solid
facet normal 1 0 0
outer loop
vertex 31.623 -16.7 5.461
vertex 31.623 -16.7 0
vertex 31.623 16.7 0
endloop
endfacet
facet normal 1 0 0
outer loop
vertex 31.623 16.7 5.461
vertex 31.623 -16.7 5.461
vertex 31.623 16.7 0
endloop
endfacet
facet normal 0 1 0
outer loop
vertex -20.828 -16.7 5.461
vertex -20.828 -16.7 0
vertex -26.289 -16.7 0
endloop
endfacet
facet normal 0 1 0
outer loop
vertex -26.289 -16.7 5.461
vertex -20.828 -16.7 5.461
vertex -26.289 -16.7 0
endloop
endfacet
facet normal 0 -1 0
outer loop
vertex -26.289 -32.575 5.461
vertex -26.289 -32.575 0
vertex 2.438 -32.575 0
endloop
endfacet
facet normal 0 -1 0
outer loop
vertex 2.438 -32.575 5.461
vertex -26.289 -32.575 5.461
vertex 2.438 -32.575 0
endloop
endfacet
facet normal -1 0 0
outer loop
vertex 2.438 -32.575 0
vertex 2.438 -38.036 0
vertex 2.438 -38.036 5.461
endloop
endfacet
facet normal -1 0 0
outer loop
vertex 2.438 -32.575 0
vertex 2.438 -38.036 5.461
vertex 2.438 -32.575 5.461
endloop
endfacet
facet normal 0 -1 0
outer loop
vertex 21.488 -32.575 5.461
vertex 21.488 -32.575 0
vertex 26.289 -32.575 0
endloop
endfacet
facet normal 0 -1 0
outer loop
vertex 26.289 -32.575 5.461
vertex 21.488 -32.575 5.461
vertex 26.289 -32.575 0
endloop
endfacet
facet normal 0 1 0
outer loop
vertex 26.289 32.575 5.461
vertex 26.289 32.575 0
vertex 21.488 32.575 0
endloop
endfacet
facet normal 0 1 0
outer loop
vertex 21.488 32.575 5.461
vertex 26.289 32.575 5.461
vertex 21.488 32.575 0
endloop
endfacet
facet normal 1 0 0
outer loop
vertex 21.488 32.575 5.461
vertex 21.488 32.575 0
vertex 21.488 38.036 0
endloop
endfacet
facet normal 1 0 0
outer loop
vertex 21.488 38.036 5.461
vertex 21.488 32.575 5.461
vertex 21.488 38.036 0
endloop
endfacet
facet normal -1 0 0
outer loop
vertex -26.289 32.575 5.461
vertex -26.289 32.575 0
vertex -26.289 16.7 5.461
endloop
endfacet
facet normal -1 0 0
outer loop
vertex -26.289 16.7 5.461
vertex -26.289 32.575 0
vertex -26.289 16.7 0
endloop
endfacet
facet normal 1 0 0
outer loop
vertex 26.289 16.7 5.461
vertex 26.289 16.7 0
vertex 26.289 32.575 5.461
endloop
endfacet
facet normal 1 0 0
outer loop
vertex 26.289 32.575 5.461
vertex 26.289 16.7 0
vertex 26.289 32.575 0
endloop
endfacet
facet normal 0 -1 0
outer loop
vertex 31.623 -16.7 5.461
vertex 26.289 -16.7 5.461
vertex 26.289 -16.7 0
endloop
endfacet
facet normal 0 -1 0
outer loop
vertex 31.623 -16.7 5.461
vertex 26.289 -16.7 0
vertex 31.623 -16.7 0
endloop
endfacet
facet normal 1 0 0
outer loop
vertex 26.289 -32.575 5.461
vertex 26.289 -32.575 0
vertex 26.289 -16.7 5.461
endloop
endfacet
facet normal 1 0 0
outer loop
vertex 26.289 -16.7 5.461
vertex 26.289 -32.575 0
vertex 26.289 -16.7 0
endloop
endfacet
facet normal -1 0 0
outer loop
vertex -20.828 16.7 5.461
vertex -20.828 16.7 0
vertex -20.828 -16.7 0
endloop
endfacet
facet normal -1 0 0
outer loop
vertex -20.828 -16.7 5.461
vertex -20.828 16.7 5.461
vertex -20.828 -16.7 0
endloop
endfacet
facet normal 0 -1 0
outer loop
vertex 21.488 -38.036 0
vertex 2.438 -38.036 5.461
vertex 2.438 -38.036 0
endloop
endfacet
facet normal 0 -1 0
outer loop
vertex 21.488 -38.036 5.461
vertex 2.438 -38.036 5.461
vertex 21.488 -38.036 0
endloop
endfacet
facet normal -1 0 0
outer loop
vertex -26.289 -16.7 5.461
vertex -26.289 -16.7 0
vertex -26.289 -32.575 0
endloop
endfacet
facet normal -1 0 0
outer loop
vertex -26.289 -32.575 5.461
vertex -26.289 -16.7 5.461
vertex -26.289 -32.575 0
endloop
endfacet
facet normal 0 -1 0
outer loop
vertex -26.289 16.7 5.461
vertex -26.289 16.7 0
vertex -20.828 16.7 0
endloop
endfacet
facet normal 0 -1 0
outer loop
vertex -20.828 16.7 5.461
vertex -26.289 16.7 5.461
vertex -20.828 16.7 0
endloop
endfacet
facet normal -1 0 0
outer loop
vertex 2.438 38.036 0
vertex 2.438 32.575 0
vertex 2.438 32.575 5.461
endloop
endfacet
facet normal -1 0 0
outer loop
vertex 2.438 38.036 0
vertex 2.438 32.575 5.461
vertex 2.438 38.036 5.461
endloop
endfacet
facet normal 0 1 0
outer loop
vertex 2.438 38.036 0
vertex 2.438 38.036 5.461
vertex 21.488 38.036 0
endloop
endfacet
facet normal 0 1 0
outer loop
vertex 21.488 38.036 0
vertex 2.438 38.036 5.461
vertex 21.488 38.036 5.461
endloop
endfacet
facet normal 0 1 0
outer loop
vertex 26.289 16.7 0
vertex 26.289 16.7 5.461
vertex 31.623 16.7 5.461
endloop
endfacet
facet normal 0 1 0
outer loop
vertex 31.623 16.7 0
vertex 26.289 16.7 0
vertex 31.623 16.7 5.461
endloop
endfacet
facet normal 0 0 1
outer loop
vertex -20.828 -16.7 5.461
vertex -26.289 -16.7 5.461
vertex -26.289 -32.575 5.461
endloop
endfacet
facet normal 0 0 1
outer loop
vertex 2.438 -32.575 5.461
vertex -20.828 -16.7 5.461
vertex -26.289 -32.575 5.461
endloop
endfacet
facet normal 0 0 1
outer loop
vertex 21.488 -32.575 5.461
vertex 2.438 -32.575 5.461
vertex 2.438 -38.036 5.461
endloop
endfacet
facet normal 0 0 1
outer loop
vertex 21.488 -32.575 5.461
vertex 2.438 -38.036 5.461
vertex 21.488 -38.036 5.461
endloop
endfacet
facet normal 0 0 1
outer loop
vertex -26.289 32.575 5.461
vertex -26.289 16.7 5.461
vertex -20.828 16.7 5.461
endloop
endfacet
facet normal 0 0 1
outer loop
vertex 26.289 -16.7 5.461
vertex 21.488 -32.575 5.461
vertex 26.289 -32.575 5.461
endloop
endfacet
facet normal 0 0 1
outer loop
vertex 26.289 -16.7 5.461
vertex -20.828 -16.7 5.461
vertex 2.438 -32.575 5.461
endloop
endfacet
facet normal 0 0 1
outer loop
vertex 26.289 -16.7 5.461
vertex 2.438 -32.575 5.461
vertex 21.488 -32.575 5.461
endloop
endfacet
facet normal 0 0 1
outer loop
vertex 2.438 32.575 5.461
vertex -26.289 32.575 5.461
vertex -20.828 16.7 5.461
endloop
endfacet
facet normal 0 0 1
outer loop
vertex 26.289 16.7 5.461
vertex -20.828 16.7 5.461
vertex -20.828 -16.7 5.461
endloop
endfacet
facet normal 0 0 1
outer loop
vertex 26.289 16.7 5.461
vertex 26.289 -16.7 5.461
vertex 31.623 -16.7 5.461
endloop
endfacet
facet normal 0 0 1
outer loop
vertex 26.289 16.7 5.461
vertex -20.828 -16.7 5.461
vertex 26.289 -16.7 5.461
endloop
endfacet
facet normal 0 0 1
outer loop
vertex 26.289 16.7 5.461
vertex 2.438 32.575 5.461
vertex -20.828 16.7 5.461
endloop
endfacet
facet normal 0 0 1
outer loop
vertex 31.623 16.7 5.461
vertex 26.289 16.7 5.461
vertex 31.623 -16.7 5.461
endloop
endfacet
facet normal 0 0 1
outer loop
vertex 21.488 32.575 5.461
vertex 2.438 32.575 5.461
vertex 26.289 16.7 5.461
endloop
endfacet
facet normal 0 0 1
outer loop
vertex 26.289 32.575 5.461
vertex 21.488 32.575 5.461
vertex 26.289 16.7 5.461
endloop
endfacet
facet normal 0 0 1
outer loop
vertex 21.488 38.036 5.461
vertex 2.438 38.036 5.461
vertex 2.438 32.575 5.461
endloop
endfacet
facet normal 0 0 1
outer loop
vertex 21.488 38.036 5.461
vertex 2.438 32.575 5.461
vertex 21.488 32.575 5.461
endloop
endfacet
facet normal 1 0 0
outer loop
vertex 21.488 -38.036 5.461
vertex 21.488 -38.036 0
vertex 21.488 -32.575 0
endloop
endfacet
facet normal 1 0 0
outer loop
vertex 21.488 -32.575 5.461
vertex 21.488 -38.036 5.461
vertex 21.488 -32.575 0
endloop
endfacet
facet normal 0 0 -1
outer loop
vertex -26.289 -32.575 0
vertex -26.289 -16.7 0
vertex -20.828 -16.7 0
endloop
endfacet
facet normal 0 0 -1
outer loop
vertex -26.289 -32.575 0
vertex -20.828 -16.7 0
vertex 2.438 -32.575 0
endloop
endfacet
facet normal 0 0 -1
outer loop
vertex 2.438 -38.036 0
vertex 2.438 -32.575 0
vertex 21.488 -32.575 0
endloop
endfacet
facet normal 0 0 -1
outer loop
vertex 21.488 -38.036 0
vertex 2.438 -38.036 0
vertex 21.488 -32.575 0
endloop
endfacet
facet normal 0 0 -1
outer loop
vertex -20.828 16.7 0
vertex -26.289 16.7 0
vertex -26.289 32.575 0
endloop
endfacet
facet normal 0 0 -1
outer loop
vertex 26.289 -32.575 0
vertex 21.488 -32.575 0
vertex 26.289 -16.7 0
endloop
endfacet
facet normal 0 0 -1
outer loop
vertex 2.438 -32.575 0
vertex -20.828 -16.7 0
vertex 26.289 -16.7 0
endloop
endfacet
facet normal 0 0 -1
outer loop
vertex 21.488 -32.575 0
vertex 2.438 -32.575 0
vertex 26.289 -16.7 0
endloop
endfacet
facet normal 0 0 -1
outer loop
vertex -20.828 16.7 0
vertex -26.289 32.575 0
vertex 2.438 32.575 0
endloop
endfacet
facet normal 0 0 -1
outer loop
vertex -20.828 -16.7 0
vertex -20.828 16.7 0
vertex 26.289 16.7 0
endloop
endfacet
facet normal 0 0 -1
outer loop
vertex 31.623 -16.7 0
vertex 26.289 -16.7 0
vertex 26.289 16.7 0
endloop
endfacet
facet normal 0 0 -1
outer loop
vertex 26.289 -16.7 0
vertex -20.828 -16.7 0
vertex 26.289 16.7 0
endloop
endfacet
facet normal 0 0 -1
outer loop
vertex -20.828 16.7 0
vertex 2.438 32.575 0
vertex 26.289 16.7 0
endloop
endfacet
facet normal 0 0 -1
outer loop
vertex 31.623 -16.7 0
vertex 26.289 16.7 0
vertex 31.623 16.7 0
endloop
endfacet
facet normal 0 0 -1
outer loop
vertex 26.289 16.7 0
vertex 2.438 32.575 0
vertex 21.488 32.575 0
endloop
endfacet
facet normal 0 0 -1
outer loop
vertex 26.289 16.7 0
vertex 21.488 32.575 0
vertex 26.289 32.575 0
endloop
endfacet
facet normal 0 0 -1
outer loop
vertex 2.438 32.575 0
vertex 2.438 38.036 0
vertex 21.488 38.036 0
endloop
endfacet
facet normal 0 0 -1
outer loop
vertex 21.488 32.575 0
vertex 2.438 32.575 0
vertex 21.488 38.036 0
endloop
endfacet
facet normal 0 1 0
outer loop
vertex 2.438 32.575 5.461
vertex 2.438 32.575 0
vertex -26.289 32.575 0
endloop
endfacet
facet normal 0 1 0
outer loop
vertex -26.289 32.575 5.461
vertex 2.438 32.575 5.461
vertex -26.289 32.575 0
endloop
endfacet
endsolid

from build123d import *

# Parameters (mm, degrees)
SKETCH1_W           = 5.334
SKETCH1_H           = 33.401
BOSS_EXTRUDE1_DEPTH = 5.461
SKETCH2_W           = 19.05
SKETCH2_H           = 5.461
BOSS_EXTRUDE2_DEPTH = 5.461


with BuildPart() as part:
    # Sketch1 → Boss-Extrude1 (new body)
    with BuildSketch(Plane.XY):
        Polygon((26.289, 32.5755), (-26.289, 32.5755), (-26.289, 16.7005), (-20.828, 16.7005), (-20.828, -16.7005), (-26.289, -16.7005), (-26.289, -32.5755), (26.289, -32.5755), (26.289, -16.7005), (26.289, 16.7005), align=None)
        with Locations((28.956, 0)):
            Rectangle(SKETCH1_W, SKETCH1_H)
    extrude(amount=BOSS_EXTRUDE1_DEPTH)

    # Sketch2 → Boss-Extrude2 (add)
    with BuildSketch(Plane.XY.offset(5.461)):
        with Locations((11.9634, 35.306)):
            Rectangle(SKETCH2_W, SKETCH2_H)
        with Locations((11.9634, -35.306)):
            Rectangle(SKETCH2_W, SKETCH2_H)
    extrude(amount=-BOSS_EXTRUDE2_DEPTH)


solid = part.part
